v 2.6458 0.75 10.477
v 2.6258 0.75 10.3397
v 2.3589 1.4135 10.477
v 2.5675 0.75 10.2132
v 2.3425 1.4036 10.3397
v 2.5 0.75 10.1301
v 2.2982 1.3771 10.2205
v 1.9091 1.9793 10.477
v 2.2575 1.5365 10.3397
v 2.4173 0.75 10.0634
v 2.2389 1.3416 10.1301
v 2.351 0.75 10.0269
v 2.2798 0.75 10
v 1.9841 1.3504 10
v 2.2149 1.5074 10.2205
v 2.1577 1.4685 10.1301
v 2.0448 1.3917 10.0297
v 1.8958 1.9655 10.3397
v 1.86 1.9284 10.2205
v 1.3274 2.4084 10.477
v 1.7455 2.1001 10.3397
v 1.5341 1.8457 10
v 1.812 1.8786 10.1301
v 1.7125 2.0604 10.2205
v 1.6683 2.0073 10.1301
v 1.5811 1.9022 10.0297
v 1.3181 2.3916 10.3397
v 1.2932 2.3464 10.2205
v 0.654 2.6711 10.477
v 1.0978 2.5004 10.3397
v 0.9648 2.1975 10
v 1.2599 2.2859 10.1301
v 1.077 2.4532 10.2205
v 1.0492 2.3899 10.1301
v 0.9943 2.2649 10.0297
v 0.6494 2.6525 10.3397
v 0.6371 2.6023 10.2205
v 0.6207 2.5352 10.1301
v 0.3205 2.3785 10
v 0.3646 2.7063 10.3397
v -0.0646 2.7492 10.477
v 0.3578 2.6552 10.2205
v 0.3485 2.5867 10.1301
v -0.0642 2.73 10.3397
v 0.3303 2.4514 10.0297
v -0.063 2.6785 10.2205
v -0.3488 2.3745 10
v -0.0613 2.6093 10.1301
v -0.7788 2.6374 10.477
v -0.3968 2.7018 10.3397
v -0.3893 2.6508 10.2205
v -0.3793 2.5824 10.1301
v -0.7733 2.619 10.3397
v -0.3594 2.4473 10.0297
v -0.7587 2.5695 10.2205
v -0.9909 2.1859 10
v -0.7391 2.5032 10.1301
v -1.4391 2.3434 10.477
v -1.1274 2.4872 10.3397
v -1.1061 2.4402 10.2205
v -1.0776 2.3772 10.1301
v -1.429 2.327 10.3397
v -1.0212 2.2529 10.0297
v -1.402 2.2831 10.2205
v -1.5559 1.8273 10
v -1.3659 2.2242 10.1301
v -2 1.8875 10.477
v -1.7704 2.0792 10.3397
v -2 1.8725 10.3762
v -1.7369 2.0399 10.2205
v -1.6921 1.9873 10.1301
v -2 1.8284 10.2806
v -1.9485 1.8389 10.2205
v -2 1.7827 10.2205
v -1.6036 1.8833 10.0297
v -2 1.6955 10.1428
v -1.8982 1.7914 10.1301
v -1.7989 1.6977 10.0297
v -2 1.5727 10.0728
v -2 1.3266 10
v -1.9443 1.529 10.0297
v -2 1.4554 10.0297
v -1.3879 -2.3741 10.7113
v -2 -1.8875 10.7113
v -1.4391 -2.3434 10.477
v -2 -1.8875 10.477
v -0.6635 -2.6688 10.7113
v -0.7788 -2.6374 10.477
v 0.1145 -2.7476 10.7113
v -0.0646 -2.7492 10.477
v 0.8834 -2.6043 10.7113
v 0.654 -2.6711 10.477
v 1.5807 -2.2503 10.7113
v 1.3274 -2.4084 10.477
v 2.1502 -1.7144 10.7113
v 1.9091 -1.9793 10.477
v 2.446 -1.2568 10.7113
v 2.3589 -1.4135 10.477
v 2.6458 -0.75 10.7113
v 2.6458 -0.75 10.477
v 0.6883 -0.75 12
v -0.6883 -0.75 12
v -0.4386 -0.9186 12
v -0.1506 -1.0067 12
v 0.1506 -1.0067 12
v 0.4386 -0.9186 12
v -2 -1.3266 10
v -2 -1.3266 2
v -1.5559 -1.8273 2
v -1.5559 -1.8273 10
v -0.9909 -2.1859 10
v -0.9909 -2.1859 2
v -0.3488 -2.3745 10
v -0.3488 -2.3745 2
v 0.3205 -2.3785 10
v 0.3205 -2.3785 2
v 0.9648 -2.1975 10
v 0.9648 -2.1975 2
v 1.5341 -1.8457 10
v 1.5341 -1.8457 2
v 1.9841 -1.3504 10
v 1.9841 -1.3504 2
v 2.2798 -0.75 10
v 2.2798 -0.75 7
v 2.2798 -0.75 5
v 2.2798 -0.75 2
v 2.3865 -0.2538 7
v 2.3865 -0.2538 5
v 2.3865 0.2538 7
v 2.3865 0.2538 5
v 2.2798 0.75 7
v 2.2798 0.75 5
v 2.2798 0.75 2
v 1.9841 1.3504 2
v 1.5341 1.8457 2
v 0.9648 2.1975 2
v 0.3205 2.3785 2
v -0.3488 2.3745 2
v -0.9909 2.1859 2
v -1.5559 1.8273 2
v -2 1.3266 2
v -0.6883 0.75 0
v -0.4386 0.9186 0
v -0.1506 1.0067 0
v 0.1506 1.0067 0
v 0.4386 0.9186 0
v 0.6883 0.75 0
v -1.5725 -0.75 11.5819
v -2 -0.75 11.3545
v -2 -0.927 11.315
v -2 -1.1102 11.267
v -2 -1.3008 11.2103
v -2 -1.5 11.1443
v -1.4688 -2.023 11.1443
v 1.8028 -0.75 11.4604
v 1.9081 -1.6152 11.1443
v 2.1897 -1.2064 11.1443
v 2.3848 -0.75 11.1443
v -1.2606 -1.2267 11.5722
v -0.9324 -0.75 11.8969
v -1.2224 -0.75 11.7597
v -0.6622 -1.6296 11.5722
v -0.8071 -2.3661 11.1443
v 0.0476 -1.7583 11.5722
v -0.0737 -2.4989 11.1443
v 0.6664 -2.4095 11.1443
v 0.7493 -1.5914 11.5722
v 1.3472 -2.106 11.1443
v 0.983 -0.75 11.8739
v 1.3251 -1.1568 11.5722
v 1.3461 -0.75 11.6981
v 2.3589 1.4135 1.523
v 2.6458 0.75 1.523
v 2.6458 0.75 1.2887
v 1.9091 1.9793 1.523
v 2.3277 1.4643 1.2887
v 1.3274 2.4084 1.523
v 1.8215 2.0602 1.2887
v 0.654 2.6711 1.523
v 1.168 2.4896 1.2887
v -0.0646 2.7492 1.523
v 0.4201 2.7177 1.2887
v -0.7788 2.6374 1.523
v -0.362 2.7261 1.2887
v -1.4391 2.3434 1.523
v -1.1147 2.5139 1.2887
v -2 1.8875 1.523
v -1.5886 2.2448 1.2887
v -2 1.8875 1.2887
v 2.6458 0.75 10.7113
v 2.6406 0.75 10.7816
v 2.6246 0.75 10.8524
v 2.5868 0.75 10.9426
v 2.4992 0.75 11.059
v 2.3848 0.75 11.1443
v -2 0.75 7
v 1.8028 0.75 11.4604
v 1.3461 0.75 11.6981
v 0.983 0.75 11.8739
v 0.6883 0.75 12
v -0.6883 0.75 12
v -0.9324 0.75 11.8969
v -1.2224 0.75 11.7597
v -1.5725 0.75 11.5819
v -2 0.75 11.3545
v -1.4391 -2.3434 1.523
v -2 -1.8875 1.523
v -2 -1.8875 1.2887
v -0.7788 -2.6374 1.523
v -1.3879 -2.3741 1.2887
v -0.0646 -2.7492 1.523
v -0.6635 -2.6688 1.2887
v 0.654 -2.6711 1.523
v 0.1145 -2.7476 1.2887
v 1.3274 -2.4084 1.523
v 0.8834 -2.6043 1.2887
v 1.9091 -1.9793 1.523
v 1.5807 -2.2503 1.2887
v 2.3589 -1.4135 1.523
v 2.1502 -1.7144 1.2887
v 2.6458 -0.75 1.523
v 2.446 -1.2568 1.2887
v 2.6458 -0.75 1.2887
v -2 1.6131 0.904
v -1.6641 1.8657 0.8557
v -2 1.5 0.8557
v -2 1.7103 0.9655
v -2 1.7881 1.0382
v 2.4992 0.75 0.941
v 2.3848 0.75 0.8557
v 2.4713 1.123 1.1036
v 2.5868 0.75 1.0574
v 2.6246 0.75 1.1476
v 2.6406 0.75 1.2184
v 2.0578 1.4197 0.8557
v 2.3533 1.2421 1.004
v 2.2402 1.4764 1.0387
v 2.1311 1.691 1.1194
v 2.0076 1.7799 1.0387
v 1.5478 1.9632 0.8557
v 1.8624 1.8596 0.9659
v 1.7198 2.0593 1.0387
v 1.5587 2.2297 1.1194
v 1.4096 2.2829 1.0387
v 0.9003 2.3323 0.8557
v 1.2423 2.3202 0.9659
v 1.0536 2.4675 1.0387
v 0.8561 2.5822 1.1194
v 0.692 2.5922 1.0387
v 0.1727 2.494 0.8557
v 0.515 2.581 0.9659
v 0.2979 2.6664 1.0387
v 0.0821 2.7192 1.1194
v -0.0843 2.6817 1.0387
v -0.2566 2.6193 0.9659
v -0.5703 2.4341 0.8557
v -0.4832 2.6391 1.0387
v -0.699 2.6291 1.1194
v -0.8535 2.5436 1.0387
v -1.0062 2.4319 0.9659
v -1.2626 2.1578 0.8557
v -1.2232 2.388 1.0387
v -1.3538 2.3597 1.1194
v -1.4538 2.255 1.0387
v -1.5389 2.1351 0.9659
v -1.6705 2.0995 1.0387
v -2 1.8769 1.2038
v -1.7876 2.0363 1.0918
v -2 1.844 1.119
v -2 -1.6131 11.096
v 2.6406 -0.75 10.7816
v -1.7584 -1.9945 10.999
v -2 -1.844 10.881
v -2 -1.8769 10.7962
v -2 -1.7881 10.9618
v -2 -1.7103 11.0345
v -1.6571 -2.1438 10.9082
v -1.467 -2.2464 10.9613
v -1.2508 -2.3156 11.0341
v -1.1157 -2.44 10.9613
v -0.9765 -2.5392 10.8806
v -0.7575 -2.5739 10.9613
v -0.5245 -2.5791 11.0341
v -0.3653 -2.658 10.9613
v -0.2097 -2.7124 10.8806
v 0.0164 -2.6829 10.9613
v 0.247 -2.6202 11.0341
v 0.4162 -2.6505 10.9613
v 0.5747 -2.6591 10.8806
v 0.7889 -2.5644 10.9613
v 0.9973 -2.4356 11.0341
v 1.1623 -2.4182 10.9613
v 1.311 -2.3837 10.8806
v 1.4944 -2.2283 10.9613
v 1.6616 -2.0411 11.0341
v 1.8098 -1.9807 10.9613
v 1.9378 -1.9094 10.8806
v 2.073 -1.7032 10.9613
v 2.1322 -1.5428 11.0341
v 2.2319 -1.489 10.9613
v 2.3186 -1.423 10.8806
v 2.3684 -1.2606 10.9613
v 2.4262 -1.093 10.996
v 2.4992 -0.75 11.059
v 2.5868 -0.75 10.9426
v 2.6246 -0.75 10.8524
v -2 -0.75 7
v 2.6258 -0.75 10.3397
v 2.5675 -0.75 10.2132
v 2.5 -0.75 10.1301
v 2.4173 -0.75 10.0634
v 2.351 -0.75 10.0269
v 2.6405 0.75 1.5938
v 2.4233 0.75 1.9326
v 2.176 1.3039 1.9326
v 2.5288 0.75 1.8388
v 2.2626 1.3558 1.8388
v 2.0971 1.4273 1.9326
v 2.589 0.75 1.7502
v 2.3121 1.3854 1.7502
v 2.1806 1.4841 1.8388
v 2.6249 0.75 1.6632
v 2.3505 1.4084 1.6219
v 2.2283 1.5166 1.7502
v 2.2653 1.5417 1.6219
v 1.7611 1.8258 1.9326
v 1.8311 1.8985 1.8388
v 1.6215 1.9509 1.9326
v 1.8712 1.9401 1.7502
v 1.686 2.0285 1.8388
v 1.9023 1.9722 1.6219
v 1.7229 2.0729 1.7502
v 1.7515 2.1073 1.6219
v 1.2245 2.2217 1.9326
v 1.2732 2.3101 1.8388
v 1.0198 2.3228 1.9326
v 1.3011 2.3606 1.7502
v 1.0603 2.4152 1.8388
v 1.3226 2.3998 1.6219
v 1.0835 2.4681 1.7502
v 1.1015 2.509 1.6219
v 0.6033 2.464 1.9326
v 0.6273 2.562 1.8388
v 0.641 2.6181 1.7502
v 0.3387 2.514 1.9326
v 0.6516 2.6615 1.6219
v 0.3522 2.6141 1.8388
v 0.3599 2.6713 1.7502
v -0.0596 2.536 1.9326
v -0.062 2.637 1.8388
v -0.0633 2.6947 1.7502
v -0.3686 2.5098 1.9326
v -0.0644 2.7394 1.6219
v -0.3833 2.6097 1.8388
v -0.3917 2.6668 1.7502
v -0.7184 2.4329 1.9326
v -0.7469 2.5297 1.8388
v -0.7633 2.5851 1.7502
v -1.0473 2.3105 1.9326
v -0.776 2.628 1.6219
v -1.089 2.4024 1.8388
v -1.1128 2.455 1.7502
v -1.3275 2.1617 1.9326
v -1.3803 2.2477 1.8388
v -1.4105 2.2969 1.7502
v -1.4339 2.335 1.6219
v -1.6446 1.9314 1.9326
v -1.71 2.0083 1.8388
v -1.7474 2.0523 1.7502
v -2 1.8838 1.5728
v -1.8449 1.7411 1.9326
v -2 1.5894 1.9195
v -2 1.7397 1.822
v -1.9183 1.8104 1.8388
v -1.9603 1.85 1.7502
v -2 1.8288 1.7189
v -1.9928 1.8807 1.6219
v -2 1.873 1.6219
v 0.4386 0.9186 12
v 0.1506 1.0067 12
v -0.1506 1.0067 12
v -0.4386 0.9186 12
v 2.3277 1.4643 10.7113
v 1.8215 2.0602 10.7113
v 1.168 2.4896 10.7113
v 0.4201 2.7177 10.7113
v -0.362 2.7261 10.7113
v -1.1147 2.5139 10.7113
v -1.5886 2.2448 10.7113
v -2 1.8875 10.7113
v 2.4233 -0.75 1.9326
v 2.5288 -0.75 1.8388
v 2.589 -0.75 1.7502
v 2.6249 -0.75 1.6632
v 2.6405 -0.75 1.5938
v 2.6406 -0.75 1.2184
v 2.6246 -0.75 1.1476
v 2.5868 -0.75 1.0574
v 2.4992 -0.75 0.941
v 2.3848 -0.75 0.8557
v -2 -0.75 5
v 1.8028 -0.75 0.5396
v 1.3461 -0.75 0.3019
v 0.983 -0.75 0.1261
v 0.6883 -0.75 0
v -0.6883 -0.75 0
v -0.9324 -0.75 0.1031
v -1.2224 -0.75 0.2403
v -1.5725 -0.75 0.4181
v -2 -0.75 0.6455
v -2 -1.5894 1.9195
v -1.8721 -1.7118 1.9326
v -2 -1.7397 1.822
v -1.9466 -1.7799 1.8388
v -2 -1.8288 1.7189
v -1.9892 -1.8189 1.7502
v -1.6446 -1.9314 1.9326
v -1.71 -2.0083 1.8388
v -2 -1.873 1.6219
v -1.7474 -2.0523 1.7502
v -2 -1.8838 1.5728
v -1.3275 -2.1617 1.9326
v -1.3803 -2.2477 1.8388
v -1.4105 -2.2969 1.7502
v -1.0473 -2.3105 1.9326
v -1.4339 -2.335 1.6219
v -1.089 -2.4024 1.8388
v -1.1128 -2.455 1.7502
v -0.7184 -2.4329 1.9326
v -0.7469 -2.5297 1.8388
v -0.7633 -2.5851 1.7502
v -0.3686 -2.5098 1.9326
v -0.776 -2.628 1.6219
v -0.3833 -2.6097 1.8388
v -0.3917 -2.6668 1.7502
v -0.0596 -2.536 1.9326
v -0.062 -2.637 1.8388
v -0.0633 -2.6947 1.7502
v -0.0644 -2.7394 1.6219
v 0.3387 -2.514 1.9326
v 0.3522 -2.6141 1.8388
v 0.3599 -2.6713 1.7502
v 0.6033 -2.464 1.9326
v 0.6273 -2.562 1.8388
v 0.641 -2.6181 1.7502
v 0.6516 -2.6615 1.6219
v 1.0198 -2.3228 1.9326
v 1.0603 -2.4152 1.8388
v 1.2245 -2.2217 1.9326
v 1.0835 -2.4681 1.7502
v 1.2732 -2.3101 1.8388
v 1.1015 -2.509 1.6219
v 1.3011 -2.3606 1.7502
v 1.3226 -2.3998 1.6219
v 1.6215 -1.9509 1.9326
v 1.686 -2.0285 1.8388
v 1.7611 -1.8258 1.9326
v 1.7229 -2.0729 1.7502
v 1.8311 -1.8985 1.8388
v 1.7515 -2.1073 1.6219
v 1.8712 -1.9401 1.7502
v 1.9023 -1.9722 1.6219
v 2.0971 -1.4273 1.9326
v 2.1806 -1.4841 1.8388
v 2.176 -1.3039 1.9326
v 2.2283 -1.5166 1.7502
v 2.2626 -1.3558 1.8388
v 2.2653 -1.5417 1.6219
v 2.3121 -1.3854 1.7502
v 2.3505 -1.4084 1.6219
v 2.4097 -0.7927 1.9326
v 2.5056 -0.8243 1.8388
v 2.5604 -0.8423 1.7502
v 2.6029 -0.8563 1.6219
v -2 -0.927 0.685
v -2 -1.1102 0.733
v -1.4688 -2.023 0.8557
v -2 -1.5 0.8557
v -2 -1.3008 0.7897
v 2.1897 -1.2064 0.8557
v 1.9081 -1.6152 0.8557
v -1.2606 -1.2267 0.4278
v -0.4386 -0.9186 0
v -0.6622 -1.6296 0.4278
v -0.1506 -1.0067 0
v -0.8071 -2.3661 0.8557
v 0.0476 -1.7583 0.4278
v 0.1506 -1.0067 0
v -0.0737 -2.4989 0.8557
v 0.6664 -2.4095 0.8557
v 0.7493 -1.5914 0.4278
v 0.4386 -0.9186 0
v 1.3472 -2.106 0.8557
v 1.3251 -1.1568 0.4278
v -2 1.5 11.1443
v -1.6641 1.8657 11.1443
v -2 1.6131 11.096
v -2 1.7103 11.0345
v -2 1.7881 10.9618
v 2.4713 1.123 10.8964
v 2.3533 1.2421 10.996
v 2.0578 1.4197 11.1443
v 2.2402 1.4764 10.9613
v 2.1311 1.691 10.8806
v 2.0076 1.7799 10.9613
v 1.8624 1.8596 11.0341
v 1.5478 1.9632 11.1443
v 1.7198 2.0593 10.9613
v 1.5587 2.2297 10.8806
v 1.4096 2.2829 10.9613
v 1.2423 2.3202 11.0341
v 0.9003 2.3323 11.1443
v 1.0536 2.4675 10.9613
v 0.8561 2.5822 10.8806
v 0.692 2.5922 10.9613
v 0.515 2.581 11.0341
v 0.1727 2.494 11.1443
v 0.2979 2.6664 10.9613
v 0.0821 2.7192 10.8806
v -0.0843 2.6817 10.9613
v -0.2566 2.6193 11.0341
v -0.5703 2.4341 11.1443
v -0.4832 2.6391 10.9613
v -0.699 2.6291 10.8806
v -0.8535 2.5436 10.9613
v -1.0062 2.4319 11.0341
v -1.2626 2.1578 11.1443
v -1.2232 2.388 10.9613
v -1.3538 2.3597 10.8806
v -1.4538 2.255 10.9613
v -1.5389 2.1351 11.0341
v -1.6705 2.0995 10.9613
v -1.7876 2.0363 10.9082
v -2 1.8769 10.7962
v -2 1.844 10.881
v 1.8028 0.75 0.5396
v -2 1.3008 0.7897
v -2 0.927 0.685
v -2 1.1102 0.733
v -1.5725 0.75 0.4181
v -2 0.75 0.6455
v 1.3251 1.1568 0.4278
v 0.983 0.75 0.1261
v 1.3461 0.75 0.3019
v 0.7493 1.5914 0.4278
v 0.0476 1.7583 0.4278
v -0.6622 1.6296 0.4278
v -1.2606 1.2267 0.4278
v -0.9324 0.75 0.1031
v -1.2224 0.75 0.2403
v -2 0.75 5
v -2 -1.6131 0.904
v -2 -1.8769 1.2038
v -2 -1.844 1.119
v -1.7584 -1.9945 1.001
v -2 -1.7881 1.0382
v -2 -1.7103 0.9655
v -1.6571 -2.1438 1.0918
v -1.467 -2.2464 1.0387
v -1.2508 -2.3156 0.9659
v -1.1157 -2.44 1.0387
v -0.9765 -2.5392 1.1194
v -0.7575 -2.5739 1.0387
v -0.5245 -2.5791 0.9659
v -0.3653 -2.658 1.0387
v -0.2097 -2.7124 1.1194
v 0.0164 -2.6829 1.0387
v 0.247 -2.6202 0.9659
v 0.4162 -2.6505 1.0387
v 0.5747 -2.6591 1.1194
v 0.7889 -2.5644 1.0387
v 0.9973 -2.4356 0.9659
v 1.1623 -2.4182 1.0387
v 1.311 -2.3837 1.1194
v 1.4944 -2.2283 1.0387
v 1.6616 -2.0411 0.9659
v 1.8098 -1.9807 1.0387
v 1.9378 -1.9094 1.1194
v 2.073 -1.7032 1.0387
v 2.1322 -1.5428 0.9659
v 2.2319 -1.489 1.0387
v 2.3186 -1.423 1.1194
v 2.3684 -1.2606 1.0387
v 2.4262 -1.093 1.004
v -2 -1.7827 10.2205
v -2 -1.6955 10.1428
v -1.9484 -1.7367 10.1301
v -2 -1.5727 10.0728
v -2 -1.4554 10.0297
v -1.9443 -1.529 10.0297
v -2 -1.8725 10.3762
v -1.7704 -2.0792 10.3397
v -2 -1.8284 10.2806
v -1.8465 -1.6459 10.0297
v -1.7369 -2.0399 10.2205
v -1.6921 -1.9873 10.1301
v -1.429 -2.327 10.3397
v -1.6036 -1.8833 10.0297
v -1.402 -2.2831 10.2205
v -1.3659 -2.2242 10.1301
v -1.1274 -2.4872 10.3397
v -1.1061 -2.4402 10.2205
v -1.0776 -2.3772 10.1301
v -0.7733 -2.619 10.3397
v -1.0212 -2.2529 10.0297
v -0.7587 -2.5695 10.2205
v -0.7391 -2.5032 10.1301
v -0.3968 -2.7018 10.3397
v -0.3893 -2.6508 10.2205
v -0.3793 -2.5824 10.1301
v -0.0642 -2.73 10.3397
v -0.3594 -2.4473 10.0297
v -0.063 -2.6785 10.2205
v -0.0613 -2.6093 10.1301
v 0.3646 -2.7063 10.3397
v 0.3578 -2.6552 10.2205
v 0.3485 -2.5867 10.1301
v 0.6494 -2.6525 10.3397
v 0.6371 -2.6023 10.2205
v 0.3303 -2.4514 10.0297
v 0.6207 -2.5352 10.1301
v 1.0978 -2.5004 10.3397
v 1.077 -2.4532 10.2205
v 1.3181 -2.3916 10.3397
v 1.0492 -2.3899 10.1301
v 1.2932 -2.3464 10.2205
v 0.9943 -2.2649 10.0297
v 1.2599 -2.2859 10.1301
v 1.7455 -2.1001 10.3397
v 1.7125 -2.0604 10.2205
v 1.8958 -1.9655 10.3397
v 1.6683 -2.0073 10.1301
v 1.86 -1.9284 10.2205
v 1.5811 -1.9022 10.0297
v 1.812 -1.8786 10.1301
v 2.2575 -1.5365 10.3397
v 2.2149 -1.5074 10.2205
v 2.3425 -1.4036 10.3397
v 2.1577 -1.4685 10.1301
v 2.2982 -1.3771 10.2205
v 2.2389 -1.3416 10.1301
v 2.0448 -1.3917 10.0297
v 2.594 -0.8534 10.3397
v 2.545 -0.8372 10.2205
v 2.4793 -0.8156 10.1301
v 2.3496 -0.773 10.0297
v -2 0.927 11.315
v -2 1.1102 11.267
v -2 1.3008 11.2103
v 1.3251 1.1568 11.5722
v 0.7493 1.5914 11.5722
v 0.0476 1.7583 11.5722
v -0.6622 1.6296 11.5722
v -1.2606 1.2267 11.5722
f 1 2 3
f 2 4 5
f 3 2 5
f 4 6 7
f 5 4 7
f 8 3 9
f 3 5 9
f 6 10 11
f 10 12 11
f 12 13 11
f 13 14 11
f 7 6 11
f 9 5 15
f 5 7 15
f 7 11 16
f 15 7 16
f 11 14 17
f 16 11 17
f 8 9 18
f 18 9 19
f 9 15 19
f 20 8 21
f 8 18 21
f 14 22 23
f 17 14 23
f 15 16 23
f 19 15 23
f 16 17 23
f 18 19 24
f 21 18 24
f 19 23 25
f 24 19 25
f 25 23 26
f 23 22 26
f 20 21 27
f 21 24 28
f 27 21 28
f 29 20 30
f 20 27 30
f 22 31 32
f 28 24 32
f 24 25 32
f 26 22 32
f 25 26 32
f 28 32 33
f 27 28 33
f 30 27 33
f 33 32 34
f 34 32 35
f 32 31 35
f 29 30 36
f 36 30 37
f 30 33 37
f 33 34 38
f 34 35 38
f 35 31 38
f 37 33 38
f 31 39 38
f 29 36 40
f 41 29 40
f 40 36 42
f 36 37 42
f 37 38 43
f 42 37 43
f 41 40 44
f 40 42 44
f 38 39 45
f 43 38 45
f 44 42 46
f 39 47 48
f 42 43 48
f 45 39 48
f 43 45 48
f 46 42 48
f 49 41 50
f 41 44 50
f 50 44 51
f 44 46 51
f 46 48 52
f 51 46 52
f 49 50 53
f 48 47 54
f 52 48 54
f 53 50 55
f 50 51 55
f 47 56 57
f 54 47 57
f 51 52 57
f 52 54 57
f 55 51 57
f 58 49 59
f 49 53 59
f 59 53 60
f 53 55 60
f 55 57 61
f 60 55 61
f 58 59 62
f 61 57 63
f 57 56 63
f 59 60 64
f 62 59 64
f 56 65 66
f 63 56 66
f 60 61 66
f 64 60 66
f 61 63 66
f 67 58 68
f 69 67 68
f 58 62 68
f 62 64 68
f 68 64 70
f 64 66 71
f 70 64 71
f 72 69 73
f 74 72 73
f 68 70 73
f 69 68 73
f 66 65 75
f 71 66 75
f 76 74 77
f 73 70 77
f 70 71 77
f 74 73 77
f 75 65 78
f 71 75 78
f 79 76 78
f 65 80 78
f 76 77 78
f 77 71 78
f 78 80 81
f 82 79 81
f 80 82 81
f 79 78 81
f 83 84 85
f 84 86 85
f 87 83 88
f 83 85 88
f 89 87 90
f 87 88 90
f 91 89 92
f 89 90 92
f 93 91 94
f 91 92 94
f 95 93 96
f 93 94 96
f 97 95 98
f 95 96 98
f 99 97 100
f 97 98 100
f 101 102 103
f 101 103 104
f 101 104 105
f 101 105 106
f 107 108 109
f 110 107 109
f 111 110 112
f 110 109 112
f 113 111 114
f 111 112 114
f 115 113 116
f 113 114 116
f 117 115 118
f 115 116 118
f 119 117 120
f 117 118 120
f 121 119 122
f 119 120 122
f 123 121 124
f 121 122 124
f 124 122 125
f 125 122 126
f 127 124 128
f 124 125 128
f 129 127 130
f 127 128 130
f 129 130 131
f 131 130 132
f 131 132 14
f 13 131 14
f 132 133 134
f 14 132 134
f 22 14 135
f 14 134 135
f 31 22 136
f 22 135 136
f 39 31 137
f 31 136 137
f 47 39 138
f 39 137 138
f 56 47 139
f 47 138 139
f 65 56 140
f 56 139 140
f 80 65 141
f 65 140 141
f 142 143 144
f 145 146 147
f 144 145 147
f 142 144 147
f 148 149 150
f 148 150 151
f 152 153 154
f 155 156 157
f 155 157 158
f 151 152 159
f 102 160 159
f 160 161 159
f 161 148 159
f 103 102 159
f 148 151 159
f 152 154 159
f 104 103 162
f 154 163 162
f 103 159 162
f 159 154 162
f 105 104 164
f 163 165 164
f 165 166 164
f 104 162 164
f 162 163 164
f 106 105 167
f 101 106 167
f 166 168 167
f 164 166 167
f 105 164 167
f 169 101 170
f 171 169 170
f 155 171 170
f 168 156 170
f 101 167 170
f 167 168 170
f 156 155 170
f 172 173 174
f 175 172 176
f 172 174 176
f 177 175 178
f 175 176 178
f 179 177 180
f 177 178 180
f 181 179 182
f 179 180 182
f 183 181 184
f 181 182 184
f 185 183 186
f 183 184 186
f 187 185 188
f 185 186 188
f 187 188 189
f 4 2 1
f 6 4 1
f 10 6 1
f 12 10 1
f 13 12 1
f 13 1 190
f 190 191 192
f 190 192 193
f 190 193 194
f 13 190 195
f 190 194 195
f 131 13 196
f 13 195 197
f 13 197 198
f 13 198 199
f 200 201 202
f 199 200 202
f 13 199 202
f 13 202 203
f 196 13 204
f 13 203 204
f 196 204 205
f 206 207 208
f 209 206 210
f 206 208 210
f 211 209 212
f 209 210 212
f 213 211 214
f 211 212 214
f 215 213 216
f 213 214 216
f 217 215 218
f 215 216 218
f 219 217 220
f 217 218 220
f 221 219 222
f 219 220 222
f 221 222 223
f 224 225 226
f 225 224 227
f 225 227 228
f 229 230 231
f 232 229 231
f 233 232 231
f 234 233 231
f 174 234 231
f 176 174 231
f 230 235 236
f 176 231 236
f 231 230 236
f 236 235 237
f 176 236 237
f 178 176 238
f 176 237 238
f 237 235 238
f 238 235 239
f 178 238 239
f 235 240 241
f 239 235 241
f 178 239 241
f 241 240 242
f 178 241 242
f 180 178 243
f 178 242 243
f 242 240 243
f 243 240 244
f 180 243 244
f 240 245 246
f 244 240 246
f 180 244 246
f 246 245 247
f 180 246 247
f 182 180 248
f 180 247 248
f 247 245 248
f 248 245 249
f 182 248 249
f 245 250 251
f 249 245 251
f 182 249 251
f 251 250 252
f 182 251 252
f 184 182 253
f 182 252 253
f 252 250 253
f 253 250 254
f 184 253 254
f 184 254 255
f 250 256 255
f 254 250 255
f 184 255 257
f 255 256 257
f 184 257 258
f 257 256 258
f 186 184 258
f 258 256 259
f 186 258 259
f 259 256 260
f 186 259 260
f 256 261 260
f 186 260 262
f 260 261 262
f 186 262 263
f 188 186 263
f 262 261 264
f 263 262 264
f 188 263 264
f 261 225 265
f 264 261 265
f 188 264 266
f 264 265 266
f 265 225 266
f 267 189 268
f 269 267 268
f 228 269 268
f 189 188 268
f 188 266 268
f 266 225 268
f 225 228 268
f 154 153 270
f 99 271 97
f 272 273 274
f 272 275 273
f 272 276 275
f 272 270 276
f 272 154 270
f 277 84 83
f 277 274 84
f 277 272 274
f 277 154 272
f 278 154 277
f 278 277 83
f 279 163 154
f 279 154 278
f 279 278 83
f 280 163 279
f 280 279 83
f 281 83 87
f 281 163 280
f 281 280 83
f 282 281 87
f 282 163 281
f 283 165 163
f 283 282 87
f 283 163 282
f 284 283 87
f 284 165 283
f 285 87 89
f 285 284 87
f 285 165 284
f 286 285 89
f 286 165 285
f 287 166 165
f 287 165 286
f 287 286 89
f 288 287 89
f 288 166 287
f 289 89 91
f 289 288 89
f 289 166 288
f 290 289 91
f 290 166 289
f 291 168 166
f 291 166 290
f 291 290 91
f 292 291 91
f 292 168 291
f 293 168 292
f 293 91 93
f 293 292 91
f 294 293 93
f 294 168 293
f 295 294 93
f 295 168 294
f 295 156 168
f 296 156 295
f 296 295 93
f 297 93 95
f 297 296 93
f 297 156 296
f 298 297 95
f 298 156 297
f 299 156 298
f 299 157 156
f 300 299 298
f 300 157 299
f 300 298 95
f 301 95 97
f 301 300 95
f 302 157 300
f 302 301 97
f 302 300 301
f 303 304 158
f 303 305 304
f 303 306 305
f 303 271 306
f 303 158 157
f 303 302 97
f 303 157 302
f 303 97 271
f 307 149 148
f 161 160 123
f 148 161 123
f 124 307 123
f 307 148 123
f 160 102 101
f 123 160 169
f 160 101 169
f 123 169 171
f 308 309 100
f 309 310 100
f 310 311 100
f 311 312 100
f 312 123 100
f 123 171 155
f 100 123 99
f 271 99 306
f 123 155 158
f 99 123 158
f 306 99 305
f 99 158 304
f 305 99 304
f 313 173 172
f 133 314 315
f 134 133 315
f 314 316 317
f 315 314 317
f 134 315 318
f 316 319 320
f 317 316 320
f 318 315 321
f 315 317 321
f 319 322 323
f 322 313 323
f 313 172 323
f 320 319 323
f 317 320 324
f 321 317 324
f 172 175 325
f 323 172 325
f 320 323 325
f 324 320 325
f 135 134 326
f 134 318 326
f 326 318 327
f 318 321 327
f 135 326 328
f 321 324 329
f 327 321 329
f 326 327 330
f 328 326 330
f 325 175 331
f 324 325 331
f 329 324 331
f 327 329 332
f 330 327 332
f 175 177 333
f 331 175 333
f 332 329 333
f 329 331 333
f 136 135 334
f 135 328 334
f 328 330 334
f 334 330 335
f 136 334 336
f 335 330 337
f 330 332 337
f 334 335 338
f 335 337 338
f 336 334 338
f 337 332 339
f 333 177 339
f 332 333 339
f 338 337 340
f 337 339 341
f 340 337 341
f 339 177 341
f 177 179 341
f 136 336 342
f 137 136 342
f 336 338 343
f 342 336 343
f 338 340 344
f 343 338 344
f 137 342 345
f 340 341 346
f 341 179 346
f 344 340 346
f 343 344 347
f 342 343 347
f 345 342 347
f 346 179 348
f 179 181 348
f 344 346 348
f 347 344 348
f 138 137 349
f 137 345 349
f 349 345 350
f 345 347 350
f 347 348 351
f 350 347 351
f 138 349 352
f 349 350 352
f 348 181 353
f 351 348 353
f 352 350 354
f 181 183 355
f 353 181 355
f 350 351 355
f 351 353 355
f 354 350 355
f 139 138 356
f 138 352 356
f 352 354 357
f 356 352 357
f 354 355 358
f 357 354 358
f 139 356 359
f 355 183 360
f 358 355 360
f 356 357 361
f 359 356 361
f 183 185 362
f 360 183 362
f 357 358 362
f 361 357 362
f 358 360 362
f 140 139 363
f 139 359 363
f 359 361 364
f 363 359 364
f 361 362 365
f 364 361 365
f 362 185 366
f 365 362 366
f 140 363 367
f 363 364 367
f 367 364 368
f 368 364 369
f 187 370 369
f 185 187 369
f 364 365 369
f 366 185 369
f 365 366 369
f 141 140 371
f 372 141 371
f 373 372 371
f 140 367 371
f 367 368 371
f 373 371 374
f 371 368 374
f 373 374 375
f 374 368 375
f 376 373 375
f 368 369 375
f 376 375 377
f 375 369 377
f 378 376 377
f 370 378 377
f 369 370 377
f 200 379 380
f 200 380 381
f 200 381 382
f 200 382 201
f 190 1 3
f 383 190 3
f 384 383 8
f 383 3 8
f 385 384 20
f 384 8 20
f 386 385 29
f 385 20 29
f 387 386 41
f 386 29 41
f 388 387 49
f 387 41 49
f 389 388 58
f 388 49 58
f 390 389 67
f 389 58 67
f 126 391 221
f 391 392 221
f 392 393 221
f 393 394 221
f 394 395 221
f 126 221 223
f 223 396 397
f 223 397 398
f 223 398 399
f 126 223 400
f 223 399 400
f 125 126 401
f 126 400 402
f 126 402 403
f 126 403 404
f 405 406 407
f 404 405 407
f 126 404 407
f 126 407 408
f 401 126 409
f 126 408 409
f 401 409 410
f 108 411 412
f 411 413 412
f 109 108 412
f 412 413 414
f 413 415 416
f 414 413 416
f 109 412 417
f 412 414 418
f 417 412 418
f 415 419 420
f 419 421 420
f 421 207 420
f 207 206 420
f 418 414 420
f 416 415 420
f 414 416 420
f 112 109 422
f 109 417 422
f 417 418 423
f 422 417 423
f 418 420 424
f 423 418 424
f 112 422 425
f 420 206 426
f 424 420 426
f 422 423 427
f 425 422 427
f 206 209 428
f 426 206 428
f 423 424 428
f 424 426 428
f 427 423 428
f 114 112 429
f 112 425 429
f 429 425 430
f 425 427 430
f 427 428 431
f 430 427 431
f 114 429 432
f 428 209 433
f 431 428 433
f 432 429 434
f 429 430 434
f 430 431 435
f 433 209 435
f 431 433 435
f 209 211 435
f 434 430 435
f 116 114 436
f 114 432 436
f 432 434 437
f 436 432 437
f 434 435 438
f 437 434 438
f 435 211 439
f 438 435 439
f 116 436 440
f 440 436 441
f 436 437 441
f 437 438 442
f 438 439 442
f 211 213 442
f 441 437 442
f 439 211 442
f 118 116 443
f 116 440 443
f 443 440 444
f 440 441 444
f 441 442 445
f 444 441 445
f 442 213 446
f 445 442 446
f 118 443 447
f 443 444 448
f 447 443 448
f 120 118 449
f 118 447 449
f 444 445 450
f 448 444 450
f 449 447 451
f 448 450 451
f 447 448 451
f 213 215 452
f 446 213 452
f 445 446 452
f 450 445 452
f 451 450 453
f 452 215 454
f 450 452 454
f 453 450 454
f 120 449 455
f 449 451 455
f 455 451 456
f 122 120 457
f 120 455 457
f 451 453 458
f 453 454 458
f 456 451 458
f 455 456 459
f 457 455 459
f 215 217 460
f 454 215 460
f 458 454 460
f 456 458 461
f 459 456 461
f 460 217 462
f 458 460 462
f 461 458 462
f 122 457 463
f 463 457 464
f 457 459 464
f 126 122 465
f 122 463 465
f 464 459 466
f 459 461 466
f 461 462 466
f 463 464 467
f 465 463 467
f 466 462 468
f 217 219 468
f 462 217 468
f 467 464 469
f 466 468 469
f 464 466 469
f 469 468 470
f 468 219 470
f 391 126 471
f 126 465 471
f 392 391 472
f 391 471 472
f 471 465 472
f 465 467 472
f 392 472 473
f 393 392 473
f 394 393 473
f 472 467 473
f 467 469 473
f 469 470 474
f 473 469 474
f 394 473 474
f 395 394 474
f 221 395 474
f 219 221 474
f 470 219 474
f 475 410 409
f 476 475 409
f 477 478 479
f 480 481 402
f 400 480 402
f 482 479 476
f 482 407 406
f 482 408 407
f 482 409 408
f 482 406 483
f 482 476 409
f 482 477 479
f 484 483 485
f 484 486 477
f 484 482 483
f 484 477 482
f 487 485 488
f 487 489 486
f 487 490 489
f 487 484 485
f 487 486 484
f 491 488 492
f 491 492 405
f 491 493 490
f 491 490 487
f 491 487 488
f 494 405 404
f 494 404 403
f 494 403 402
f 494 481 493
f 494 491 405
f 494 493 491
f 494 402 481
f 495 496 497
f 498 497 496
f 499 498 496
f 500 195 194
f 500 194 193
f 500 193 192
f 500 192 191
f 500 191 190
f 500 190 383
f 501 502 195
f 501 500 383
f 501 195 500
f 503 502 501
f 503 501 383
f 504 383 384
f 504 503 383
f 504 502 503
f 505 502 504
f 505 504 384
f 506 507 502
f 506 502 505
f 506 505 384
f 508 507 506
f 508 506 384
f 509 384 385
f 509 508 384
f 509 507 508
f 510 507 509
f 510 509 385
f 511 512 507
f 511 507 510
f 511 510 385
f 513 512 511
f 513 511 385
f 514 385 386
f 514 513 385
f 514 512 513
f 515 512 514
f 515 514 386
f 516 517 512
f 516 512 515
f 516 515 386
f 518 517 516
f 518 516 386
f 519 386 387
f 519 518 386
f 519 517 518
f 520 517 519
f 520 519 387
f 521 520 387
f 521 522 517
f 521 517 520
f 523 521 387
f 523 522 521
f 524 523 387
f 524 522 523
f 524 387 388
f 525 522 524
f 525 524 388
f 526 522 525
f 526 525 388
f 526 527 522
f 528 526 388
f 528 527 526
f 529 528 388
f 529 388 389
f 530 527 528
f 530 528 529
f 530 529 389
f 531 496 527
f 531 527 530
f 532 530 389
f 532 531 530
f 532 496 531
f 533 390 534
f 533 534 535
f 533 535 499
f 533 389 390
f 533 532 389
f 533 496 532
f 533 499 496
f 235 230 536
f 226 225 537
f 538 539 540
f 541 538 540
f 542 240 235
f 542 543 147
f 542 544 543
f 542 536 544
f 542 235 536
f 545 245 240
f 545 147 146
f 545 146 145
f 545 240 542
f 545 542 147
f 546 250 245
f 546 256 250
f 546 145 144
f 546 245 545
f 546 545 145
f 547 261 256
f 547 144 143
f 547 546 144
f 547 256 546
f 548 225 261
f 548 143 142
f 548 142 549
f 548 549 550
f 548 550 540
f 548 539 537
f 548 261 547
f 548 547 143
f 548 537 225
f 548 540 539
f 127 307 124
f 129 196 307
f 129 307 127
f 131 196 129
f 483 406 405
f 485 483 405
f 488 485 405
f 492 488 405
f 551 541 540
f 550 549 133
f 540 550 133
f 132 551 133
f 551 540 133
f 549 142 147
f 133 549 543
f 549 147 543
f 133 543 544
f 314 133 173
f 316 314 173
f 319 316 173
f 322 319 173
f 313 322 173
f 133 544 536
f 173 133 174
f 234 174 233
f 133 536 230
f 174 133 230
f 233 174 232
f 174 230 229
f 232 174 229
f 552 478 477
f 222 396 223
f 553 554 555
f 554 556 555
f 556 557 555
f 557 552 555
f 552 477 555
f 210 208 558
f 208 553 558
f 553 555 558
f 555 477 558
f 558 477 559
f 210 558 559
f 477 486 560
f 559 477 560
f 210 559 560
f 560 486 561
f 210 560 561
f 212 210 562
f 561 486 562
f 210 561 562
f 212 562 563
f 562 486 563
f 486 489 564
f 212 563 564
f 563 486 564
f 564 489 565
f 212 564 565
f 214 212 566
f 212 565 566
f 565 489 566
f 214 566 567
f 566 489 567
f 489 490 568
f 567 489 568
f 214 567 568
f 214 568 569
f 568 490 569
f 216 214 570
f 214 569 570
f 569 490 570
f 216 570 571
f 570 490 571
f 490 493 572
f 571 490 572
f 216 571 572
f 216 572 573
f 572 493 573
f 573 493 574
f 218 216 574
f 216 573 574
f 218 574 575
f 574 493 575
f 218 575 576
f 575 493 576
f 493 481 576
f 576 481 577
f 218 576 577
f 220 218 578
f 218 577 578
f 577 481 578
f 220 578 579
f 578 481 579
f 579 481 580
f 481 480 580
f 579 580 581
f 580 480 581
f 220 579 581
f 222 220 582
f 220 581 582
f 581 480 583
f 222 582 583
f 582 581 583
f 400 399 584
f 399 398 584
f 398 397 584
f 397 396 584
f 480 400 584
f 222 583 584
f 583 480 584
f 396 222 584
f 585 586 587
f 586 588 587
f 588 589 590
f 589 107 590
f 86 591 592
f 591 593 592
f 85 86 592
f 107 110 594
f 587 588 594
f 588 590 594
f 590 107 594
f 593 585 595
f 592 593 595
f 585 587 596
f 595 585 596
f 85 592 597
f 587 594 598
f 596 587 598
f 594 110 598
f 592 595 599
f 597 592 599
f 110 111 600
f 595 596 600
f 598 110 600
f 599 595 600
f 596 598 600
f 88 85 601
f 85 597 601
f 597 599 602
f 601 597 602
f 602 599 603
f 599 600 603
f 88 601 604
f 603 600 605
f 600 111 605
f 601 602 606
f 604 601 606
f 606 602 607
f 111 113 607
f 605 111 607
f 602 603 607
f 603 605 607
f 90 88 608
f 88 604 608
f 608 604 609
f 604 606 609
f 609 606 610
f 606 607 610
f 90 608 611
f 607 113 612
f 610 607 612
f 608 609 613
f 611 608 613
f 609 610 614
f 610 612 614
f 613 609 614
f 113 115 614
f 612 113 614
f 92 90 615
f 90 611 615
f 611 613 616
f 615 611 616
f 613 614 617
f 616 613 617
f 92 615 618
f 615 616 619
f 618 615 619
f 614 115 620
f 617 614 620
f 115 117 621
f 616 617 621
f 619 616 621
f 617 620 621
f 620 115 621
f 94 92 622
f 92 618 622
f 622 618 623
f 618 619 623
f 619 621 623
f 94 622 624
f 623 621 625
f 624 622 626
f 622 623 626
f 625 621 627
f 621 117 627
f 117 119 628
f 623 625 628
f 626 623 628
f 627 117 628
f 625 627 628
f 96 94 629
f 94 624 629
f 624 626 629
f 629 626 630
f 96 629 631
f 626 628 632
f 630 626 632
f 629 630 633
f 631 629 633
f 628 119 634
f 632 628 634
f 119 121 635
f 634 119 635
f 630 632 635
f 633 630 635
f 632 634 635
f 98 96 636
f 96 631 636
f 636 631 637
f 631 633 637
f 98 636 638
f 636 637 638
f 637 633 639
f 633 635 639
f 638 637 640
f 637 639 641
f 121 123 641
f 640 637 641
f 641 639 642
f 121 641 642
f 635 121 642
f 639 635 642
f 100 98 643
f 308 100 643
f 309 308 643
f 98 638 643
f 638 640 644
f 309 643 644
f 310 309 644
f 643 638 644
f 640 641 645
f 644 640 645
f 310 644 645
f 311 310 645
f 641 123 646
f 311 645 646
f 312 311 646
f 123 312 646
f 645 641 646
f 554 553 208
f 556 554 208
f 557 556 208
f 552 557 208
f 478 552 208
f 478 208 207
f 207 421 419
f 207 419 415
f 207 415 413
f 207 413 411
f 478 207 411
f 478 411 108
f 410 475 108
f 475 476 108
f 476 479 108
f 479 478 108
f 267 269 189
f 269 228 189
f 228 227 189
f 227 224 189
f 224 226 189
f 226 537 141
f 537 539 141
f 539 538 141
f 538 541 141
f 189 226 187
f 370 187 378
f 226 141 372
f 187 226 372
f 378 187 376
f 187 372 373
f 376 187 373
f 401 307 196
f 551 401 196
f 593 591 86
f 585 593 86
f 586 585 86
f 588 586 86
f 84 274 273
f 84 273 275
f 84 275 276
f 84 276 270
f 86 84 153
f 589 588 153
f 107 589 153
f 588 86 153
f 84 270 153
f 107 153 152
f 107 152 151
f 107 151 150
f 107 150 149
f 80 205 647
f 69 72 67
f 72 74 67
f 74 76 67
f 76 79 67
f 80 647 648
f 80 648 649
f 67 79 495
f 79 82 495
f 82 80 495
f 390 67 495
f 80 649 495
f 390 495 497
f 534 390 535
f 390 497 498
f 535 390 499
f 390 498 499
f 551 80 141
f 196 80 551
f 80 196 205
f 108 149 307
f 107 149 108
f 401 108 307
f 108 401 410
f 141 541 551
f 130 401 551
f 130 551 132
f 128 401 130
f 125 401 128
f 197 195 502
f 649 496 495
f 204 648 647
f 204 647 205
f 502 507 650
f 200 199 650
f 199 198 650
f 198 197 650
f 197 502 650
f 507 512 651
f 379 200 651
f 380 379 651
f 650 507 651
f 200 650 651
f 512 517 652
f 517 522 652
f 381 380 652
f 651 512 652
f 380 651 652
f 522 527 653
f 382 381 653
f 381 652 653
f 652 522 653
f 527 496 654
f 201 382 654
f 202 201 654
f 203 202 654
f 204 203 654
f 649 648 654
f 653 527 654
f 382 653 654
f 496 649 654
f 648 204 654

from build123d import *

# Parameters (mm, degrees)
F0_R         = 2.75
F1_DEPTH     = 2
F2_R         = 2.4
F3_DEPTH     = 8
F4_R         = 2.75
F5_DEPTH     = 2
F8_DEPTH     = 5
F10_DEPTH    = 5
F11_C1_SIZE2 = 1
F11_C1_SIZE  = 1.7320508076
F11_C2_SIZE2 = 1
F11_C2_SIZE  = 1.7320508076
F12_C1_SIZE2 = 1
F12_C1_SIZE  = 1.7320508076
F12_C2_SIZE2 = 1
F12_C2_SIZE  = 1.7320508076
F13_R        = 0.5
F15_DEPTH    = 25


# Not quite as in the source:
# - a fillet or chamfer that OpenCascade refuses, or shapes differently, is made with other operations: its cross-section is extruded or revolved along the edge and cut away or added


with BuildPart() as f1:
    # F0 (on Top) → F1 (new body)
    with BuildSketch(Plane.XY):
        Circle(F0_R)
    extrude(amount=F1_DEPTH)

    # F2 (on face) → F3 (join)
    with BuildSketch(Plane.XY.offset(2)):
        Circle(F2_R)
    extrude(amount=F3_DEPTH)

    # F4 (on face) → F5 (join)
    with BuildSketch(Plane.XY.offset(10)):
        Circle(F4_R)
    extrude(amount=F5_DEPTH)

    # F6: fillet of radius 0.5 on 2 edges, made by hand

    # F6_s1 → F6_t2 (revolve, cut)
    with BuildSketch(Plane.XZ):
        with BuildLine():
            ThreePointArc((2.4, 2), (2.6531128874, 1.8188343884), (2.75, 1.5230303993))
            Line((2.75, 1.5230303993), (2.75, 2))
            Line((2.75, 2), (2.4, 2))
        make_face()
    revolve(axis=Axis((0, 0, 2), (0, 0, 1)), mode=Mode.SUBTRACT)

    # F6_s3 → F6_t4 (revolve, cut)
    with BuildSketch(Plane.XZ):
        with BuildLine():
            ThreePointArc((2.75, 10.4769696007), (2.6531128874, 10.1811656116), (2.4, 10))
            Line((2.4, 10), (2.75, 10))
            Line((2.75, 10), (2.75, 10.4769696007))
        make_face()
    revolve(axis=Axis((0, 0, 10), (0, 0, 1)), mode=Mode.SUBTRACT)

    # F7 (on face) → F8 (cut)
    with BuildSketch(Plane(origin=(0, 0, 0), x_dir=(1, 0, 0), z_dir=(0, 0, -1))):
        with BuildLine():
            ThreePointArc((-2.6457513111, 0.75), (-2.75, 0), (-2.6457513111, -0.75))
            Line((-2.6457513111, -0.75), (2.6457513111, -0.75))
            ThreePointArc((2.6457513111, -0.75), (2.75, 0), (2.6457513111, 0.75))
            Line((2.6457513111, 0.75), (-2.6457513111, 0.75))
        make_face()
    extrude(amount=-F8_DEPTH, mode=Mode.SUBTRACT)

    # F9 (on face) → F10 (cut)
    with BuildSketch(Plane.XY.offset(12)):
        with BuildLine():
            ThreePointArc((-2.6457513111, 0.75), (-2.75, 0), (-2.6457513111, -0.75))
            Line((-2.6457513111, -0.75), (2.6457513111, -0.75))
            ThreePointArc((2.6457513111, -0.75), (2.75, 0), (2.6457513111, 0.75))
            Line((2.6457513111, 0.75), (-2.6457513111, 0.75))
        make_face()
    extrude(amount=-F10_DEPTH, mode=Mode.SUBTRACT)

    # F11: chamfer of 1 x 1.7320508076 on 2 edges, made by hand

    # F11_c1
    f11_c1_edges = [f1.edges().sort_by_distance(p)[0] for p in [
        (0, 2.75, 0),
    ]]
    f11_c1_side = f1.faces().sort_by_distance((0, 2.73, 0))[0]
    chamfer(f11_c1_edges, length=F11_C1_SIZE, length2=F11_C1_SIZE2, reference=f11_c1_side)

    # F11_c2
    f11_c2_edges = [f1.edges().sort_by_distance(p)[0] for p in [
        (0, -2.75, 0),
    ]]
    f11_c2_side = f1.faces().sort_by_distance((0, -2.73, 0))[0]
    chamfer(f11_c2_edges, length=F11_C2_SIZE, length2=F11_C2_SIZE2, reference=f11_c2_side)

    # F12: chamfer of 1 x 1.7320508076 on 2 edges, made by hand

    # F12_c1
    f12_c1_edges = [f1.edges().sort_by_distance(p)[0] for p in [
        (0, -2.75, 12),
    ]]
    f12_c1_side = f1.faces().sort_by_distance((0, -2.73, 12))[0]
    chamfer(f12_c1_edges, length=F12_C1_SIZE, length2=F12_C1_SIZE2, reference=f12_c1_side)

    # F12_c2
    f12_c2_edges = [f1.edges().sort_by_distance(p)[0] for p in [
        (0, 2.75, 12),
    ]]
    f12_c2_side = f1.faces().sort_by_distance((0, 2.73, 12))[0]
    chamfer(f12_c2_edges, length=F12_C2_SIZE, length2=F12_C2_SIZE2, reference=f12_c2_side)

    # F13
    f13_edges = [f1.edges().sort_by_distance(p)[0] for p in [
        (0, -2.75, 11),
        (0, 2.75, 11),
        (0, -2.75, 1),
        (0, 2.75, 1),
    ]]
    fillet(f13_edges, radius=F13_R)

    # F14 (on face) → F15 (cut)
    with BuildSketch(Plane.XY.offset(12)):
        with BuildLine():
            Line((-2, -1.8874586088), (-2, 1.8874586088))
            ThreePointArc((-2, 1.8874586088), (-2.75, 0), (-2, -1.8874586088))
        make_face()
    extrude(amount=-F15_DEPTH, mode=Mode.SUBTRACT)


solid = f1.part
